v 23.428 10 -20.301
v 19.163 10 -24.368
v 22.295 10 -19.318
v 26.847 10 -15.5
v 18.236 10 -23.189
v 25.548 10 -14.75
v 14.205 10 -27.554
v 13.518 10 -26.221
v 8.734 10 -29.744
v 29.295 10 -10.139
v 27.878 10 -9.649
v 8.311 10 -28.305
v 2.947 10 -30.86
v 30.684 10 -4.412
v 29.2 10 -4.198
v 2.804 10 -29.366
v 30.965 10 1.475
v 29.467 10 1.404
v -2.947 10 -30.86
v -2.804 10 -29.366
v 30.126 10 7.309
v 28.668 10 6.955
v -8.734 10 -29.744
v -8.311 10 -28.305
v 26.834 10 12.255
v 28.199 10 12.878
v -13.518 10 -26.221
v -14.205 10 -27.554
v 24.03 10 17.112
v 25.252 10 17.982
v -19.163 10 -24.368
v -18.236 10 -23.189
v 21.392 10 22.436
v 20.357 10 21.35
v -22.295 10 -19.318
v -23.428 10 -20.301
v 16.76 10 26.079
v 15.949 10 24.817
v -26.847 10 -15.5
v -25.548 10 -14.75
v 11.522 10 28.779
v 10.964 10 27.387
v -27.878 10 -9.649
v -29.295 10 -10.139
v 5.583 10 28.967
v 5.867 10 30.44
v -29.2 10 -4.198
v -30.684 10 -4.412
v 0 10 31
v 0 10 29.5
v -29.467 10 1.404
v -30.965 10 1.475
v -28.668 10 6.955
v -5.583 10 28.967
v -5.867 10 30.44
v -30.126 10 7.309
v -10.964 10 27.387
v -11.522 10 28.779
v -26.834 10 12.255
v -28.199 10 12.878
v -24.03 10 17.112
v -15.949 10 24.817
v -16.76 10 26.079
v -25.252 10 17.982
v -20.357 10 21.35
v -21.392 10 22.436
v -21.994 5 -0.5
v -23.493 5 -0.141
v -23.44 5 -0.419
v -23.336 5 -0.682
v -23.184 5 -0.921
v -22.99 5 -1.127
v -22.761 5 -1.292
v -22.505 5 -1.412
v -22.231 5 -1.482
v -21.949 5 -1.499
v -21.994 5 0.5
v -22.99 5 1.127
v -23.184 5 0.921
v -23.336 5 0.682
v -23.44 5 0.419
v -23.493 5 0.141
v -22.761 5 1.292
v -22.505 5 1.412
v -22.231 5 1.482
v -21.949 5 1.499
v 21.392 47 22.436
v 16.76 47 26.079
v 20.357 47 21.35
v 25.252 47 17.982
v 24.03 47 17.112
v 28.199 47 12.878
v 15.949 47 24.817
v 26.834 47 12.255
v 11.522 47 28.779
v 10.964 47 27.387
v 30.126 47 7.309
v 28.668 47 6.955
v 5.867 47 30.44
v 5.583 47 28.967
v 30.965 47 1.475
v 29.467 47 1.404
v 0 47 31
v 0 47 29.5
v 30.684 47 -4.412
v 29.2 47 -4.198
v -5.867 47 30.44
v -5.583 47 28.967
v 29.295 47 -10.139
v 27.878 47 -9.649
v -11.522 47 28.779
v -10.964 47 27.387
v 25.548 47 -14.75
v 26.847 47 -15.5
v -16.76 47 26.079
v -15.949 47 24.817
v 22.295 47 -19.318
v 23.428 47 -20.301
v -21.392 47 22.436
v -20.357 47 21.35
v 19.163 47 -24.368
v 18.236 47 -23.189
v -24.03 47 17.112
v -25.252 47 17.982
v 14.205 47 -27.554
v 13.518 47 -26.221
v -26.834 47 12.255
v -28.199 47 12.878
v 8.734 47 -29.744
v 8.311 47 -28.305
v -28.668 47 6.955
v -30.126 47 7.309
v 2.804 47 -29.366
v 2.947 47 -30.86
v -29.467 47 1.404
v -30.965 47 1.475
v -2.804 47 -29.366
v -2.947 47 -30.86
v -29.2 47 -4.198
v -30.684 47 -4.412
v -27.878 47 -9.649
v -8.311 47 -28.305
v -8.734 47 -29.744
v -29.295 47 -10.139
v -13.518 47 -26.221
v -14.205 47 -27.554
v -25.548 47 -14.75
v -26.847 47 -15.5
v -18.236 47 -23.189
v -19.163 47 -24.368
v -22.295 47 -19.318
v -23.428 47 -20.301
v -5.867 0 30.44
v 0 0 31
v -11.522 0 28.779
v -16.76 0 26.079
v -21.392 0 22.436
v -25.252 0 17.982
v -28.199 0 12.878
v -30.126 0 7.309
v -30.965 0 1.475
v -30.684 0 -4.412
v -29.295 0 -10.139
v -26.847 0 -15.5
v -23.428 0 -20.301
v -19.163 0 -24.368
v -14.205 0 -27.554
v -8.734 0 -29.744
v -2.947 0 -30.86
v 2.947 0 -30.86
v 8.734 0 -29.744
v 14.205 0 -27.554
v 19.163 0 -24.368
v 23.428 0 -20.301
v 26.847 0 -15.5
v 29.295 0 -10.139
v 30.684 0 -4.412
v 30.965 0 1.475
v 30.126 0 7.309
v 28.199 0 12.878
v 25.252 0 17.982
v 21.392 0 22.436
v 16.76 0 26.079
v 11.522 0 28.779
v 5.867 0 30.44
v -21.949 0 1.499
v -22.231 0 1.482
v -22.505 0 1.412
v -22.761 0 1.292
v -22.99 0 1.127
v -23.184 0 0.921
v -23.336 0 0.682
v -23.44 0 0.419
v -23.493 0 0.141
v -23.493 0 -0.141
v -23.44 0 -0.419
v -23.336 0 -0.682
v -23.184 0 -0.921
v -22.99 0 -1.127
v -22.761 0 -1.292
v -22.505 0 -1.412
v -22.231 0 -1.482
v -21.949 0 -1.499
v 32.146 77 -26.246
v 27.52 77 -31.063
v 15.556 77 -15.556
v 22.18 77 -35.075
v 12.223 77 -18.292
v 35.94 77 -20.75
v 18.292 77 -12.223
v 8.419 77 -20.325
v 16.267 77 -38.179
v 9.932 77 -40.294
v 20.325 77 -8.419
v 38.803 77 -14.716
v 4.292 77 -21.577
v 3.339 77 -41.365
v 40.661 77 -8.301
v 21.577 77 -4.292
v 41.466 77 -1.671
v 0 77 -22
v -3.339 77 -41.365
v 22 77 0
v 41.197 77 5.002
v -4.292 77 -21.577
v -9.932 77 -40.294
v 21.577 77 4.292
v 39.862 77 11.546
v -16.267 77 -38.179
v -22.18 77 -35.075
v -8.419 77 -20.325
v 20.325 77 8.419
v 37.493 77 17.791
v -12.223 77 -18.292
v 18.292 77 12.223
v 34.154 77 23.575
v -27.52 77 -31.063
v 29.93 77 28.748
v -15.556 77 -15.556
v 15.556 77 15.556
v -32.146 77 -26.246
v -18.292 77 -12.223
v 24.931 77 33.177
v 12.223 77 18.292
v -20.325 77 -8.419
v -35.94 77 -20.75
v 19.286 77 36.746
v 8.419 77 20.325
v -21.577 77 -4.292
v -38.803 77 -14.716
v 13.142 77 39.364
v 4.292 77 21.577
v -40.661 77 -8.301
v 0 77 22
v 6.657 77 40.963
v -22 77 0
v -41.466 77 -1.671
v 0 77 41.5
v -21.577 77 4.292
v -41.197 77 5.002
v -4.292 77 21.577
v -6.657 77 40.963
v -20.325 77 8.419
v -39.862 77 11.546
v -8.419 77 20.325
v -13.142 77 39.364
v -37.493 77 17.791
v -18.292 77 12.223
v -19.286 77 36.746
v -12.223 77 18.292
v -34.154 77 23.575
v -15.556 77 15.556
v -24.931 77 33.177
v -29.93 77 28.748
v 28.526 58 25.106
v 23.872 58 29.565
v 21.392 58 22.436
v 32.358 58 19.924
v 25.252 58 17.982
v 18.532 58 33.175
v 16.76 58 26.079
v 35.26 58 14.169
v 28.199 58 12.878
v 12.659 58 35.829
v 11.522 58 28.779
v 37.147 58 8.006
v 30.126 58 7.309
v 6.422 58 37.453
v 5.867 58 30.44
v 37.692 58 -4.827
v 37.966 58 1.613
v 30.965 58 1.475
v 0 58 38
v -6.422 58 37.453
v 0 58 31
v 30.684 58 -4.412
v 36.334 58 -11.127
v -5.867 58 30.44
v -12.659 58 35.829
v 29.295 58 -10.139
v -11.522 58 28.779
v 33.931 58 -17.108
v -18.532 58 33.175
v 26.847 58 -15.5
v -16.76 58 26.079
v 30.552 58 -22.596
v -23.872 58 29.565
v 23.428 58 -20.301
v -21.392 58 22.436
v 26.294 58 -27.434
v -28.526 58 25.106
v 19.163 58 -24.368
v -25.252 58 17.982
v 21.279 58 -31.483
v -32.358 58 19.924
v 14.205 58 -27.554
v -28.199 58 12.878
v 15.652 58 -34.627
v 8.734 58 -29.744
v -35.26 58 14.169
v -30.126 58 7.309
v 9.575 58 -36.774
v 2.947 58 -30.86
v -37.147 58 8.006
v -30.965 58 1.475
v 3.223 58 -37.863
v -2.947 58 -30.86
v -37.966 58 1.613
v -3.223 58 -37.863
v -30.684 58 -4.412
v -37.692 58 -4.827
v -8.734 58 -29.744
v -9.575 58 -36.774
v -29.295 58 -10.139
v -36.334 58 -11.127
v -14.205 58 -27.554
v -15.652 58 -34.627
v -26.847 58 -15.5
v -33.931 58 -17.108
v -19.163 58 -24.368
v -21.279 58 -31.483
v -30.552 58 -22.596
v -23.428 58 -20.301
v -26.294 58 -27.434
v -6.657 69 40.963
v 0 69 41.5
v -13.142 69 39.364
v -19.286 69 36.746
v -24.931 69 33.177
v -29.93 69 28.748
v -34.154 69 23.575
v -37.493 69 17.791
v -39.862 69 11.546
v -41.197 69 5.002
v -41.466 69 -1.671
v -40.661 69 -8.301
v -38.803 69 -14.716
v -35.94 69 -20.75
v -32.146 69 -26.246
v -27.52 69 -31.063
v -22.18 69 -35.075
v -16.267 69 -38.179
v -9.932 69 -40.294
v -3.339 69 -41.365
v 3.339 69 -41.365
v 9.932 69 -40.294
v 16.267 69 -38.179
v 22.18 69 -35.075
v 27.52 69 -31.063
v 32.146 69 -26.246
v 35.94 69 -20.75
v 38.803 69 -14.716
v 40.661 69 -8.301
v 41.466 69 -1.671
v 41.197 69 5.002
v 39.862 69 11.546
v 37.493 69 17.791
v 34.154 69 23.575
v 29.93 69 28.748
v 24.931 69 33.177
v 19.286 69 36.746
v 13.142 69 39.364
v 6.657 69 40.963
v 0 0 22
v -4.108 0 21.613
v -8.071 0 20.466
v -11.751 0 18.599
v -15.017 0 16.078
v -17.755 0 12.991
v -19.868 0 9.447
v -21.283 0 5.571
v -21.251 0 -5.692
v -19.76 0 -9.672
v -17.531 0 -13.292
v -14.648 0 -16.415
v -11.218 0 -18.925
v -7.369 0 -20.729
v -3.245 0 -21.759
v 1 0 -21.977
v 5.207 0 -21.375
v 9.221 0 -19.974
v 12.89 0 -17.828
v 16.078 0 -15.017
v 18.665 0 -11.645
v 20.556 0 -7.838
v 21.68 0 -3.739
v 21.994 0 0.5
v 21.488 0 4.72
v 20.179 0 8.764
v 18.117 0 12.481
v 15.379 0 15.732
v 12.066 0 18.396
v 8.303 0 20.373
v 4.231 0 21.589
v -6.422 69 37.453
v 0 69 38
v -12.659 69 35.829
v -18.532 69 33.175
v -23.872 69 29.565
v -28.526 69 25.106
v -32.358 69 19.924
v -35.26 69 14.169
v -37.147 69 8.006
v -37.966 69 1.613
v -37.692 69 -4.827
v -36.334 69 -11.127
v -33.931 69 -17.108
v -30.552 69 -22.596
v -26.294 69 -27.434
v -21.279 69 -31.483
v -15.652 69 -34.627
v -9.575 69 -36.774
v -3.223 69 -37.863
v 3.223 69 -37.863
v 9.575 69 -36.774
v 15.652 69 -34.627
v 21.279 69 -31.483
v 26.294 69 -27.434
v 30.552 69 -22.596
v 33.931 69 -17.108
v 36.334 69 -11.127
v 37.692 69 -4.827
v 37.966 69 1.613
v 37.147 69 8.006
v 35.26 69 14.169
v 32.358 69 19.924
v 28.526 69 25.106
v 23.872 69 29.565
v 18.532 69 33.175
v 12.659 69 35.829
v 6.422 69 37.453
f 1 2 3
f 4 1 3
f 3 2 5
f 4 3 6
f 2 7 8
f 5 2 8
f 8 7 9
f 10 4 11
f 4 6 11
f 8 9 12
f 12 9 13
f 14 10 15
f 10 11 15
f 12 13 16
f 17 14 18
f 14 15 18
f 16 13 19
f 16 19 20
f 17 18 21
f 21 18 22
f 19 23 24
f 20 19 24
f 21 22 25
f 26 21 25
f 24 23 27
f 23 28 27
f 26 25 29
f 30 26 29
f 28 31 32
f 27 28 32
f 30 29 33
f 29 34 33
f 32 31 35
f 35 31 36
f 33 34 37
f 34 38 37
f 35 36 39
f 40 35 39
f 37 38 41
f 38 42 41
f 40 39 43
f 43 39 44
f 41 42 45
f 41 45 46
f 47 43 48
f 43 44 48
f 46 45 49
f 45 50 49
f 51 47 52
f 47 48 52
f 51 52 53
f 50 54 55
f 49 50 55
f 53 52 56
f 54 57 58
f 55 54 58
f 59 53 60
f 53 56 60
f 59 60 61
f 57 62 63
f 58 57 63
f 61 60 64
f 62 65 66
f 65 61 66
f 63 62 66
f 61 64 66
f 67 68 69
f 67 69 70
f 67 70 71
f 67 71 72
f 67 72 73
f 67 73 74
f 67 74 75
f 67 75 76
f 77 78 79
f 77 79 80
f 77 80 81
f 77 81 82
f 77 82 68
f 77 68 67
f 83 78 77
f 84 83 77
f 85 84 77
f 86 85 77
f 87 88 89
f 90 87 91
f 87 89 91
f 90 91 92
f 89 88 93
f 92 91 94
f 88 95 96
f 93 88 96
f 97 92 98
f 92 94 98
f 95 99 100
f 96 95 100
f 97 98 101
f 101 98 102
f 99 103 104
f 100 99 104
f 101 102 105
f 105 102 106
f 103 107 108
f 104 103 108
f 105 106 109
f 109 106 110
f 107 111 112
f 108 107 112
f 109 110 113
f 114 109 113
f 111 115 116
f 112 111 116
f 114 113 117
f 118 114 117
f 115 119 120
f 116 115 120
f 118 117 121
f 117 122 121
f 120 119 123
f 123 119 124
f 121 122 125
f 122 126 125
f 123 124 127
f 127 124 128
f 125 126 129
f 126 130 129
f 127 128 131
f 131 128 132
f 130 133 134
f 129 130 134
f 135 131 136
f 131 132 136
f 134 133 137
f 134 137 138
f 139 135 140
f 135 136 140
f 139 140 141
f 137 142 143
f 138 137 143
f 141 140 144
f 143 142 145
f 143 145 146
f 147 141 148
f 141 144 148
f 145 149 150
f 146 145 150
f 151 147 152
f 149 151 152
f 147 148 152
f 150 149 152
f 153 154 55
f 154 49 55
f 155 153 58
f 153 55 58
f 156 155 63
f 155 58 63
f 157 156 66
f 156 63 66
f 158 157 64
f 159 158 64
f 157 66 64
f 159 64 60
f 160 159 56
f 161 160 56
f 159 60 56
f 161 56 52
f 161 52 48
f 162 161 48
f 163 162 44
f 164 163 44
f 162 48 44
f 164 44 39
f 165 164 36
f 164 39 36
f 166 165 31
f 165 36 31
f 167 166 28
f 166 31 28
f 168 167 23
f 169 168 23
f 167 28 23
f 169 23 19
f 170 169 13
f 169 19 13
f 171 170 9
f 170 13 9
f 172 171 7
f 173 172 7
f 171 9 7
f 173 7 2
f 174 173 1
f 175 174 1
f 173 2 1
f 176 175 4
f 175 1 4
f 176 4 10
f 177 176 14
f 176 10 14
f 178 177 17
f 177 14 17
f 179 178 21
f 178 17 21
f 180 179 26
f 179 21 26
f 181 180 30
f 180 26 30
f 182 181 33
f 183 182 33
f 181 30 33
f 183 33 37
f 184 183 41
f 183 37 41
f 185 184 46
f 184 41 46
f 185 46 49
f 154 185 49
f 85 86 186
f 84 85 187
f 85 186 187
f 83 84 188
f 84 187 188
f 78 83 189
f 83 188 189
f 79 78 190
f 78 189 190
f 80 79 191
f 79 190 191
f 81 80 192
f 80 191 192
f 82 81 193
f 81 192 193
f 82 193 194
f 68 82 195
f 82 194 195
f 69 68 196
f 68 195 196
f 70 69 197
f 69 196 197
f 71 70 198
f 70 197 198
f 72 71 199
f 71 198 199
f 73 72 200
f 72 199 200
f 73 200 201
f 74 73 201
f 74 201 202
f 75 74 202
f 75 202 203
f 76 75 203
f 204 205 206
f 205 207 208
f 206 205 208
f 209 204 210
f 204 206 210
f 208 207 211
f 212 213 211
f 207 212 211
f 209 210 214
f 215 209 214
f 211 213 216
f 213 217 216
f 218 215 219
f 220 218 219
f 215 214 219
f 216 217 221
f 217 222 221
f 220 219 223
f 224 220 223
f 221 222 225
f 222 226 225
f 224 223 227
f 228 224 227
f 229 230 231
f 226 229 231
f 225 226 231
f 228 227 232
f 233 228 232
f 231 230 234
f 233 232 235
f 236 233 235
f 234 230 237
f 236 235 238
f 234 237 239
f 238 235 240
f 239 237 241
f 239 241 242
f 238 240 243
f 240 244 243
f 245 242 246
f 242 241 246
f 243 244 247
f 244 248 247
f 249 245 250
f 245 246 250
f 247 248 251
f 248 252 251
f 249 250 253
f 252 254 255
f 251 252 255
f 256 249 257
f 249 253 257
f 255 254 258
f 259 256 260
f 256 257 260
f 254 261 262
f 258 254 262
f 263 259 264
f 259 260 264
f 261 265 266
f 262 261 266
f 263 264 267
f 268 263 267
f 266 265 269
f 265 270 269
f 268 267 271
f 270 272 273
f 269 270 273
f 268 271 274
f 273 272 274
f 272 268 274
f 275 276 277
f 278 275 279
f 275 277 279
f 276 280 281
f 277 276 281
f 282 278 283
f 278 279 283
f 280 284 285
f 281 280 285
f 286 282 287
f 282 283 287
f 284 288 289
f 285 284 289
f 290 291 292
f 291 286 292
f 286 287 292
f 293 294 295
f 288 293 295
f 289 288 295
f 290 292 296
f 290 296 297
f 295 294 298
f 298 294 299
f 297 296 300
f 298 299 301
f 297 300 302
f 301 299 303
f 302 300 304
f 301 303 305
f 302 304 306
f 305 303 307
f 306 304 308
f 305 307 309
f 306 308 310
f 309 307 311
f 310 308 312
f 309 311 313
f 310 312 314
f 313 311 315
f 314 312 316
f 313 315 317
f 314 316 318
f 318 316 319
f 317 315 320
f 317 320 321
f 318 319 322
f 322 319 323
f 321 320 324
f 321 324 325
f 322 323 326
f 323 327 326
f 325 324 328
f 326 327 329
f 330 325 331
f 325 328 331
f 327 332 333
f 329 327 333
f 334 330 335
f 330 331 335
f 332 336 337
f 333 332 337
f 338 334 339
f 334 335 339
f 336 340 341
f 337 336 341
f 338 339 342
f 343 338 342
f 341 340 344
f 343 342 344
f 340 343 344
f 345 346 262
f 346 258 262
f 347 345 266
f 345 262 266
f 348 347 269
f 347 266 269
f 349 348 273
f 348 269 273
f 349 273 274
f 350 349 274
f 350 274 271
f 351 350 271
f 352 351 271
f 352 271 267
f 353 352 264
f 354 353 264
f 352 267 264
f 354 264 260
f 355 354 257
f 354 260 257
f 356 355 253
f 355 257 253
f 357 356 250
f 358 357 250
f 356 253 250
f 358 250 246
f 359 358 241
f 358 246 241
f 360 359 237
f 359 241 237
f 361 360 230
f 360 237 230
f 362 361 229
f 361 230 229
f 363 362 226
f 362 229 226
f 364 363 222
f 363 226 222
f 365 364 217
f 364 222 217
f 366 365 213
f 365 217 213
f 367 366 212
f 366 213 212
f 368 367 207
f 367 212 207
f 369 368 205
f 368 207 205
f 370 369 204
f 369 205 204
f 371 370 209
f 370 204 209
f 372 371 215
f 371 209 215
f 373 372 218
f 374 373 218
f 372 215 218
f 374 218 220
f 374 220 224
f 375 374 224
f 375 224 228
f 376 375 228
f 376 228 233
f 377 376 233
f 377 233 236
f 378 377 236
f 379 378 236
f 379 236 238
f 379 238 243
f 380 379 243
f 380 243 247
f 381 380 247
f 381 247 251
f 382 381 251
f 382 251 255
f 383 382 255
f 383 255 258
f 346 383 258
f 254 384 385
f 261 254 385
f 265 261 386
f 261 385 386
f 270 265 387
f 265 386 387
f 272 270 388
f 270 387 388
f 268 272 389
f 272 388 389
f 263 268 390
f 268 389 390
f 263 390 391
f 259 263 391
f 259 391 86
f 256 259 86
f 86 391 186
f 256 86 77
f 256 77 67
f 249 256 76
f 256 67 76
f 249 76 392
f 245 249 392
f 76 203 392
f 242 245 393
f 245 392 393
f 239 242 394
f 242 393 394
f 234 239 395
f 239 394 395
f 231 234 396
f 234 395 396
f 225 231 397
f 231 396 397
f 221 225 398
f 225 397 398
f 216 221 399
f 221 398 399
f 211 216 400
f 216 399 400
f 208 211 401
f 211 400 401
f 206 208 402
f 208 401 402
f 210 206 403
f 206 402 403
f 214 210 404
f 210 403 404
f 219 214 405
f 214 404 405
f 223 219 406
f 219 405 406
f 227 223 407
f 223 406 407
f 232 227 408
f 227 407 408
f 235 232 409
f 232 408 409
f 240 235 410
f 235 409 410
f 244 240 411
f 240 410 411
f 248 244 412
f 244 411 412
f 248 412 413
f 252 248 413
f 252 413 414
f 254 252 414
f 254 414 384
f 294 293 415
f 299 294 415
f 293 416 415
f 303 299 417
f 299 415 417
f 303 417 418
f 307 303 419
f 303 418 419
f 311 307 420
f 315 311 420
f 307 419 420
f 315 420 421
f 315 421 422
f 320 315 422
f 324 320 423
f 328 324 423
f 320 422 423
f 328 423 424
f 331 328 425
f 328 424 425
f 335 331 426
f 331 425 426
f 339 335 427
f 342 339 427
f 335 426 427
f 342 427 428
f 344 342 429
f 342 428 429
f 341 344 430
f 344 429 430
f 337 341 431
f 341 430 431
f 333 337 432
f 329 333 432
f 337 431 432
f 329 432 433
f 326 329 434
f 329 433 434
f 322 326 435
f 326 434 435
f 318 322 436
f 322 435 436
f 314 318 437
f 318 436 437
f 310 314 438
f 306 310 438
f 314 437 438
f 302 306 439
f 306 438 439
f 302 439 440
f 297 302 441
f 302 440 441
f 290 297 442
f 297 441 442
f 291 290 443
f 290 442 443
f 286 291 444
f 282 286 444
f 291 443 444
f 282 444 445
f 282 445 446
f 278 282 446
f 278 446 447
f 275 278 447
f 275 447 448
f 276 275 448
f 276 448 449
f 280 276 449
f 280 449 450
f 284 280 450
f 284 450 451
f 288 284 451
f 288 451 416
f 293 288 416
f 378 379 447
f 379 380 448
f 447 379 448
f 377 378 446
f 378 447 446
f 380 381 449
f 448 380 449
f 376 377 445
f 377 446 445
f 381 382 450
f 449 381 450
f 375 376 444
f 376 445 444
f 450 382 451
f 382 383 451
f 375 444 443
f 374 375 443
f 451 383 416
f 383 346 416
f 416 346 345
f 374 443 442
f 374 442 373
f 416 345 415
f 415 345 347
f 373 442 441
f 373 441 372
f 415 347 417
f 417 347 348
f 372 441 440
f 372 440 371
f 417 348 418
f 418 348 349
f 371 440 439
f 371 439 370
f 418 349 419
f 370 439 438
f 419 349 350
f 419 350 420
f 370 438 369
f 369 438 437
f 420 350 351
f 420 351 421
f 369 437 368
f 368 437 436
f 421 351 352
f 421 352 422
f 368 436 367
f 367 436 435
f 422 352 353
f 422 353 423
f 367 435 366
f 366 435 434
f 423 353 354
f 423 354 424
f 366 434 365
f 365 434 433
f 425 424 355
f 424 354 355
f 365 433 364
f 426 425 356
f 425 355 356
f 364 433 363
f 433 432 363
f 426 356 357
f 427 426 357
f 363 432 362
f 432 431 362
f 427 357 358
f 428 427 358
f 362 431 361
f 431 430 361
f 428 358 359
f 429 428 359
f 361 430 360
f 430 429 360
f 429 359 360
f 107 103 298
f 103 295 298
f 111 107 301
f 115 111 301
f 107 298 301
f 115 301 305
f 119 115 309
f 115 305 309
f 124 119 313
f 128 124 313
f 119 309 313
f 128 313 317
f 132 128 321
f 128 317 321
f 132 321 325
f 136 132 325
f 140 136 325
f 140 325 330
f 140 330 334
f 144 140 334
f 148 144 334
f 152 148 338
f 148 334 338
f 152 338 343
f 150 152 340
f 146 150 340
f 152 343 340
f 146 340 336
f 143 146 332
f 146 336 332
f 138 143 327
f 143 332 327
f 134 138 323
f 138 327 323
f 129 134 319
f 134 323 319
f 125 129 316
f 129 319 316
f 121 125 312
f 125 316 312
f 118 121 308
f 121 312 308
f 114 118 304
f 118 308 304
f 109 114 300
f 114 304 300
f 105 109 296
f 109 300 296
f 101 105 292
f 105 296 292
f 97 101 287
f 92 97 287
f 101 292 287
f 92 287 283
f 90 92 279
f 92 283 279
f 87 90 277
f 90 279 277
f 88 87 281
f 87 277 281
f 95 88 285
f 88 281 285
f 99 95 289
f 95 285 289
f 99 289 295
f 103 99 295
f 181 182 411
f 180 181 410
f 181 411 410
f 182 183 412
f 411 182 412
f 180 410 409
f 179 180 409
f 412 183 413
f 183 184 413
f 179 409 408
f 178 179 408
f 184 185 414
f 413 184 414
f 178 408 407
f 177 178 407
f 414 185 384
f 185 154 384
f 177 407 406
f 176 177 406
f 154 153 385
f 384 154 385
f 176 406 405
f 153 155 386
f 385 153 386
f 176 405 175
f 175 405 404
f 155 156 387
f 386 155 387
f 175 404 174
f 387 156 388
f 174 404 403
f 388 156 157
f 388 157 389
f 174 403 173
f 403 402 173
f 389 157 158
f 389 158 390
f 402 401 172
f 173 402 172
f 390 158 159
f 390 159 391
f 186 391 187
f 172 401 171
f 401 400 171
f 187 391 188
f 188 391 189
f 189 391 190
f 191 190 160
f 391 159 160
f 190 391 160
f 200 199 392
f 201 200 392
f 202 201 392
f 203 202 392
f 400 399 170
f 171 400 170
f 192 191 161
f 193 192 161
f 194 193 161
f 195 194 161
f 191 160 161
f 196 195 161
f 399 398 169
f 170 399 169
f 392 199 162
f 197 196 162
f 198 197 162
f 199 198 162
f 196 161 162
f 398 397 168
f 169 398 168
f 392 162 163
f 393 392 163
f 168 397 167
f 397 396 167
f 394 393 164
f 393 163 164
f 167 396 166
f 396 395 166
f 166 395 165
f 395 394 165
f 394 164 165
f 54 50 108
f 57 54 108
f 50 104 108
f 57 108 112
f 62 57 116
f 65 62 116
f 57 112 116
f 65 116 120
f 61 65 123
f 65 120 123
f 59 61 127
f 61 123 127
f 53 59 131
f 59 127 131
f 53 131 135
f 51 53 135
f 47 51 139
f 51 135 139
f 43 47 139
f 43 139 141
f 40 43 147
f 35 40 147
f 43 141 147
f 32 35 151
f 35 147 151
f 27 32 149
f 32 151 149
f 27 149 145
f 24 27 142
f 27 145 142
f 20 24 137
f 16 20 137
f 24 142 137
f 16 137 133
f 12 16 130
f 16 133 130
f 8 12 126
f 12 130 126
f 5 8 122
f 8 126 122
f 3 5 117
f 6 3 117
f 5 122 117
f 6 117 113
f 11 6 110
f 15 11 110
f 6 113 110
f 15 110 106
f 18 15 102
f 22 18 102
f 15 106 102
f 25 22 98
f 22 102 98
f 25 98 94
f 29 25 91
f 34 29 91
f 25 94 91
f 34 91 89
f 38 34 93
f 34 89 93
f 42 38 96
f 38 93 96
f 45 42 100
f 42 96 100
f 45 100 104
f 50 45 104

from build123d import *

# Parameters (mm, degrees)
SKETCH3_R          = 1.5
CUT_EXTRUDE1_DEPTH = 5


with BuildPart() as part:
    # Sketch2 → Revolve1 (revolve)
    with BuildSketch(Plane.XY, mode=Mode.PRIVATE) as revolve1_sk:
        Polygon((-22, 0), (-31, 0), (-31, 10), (-29.5, 10), (-29.5, 47), (-31, 47), (-31, 58), (-38, 58), (-38, 69), (-41.5, 69), (-41.5, 77), (-22, 77), align=None)
    revolve(revolve1_sk.sketch.rotate(Axis((0, 108.342465753, 0), (0, -1, 0)), 270), axis=Axis((0, 108.342465753, 0), (0, -1, 0)))  # turned: the seam where the file's is

    # Sketch3 → Cut-Extrude1 (cut)
    with BuildSketch(Plane.XZ):
        with Locations((-22, 0)):
            Circle(SKETCH3_R)
    extrude(amount=-CUT_EXTRUDE1_DEPTH, mode=Mode.SUBTRACT)


solid = part.part
